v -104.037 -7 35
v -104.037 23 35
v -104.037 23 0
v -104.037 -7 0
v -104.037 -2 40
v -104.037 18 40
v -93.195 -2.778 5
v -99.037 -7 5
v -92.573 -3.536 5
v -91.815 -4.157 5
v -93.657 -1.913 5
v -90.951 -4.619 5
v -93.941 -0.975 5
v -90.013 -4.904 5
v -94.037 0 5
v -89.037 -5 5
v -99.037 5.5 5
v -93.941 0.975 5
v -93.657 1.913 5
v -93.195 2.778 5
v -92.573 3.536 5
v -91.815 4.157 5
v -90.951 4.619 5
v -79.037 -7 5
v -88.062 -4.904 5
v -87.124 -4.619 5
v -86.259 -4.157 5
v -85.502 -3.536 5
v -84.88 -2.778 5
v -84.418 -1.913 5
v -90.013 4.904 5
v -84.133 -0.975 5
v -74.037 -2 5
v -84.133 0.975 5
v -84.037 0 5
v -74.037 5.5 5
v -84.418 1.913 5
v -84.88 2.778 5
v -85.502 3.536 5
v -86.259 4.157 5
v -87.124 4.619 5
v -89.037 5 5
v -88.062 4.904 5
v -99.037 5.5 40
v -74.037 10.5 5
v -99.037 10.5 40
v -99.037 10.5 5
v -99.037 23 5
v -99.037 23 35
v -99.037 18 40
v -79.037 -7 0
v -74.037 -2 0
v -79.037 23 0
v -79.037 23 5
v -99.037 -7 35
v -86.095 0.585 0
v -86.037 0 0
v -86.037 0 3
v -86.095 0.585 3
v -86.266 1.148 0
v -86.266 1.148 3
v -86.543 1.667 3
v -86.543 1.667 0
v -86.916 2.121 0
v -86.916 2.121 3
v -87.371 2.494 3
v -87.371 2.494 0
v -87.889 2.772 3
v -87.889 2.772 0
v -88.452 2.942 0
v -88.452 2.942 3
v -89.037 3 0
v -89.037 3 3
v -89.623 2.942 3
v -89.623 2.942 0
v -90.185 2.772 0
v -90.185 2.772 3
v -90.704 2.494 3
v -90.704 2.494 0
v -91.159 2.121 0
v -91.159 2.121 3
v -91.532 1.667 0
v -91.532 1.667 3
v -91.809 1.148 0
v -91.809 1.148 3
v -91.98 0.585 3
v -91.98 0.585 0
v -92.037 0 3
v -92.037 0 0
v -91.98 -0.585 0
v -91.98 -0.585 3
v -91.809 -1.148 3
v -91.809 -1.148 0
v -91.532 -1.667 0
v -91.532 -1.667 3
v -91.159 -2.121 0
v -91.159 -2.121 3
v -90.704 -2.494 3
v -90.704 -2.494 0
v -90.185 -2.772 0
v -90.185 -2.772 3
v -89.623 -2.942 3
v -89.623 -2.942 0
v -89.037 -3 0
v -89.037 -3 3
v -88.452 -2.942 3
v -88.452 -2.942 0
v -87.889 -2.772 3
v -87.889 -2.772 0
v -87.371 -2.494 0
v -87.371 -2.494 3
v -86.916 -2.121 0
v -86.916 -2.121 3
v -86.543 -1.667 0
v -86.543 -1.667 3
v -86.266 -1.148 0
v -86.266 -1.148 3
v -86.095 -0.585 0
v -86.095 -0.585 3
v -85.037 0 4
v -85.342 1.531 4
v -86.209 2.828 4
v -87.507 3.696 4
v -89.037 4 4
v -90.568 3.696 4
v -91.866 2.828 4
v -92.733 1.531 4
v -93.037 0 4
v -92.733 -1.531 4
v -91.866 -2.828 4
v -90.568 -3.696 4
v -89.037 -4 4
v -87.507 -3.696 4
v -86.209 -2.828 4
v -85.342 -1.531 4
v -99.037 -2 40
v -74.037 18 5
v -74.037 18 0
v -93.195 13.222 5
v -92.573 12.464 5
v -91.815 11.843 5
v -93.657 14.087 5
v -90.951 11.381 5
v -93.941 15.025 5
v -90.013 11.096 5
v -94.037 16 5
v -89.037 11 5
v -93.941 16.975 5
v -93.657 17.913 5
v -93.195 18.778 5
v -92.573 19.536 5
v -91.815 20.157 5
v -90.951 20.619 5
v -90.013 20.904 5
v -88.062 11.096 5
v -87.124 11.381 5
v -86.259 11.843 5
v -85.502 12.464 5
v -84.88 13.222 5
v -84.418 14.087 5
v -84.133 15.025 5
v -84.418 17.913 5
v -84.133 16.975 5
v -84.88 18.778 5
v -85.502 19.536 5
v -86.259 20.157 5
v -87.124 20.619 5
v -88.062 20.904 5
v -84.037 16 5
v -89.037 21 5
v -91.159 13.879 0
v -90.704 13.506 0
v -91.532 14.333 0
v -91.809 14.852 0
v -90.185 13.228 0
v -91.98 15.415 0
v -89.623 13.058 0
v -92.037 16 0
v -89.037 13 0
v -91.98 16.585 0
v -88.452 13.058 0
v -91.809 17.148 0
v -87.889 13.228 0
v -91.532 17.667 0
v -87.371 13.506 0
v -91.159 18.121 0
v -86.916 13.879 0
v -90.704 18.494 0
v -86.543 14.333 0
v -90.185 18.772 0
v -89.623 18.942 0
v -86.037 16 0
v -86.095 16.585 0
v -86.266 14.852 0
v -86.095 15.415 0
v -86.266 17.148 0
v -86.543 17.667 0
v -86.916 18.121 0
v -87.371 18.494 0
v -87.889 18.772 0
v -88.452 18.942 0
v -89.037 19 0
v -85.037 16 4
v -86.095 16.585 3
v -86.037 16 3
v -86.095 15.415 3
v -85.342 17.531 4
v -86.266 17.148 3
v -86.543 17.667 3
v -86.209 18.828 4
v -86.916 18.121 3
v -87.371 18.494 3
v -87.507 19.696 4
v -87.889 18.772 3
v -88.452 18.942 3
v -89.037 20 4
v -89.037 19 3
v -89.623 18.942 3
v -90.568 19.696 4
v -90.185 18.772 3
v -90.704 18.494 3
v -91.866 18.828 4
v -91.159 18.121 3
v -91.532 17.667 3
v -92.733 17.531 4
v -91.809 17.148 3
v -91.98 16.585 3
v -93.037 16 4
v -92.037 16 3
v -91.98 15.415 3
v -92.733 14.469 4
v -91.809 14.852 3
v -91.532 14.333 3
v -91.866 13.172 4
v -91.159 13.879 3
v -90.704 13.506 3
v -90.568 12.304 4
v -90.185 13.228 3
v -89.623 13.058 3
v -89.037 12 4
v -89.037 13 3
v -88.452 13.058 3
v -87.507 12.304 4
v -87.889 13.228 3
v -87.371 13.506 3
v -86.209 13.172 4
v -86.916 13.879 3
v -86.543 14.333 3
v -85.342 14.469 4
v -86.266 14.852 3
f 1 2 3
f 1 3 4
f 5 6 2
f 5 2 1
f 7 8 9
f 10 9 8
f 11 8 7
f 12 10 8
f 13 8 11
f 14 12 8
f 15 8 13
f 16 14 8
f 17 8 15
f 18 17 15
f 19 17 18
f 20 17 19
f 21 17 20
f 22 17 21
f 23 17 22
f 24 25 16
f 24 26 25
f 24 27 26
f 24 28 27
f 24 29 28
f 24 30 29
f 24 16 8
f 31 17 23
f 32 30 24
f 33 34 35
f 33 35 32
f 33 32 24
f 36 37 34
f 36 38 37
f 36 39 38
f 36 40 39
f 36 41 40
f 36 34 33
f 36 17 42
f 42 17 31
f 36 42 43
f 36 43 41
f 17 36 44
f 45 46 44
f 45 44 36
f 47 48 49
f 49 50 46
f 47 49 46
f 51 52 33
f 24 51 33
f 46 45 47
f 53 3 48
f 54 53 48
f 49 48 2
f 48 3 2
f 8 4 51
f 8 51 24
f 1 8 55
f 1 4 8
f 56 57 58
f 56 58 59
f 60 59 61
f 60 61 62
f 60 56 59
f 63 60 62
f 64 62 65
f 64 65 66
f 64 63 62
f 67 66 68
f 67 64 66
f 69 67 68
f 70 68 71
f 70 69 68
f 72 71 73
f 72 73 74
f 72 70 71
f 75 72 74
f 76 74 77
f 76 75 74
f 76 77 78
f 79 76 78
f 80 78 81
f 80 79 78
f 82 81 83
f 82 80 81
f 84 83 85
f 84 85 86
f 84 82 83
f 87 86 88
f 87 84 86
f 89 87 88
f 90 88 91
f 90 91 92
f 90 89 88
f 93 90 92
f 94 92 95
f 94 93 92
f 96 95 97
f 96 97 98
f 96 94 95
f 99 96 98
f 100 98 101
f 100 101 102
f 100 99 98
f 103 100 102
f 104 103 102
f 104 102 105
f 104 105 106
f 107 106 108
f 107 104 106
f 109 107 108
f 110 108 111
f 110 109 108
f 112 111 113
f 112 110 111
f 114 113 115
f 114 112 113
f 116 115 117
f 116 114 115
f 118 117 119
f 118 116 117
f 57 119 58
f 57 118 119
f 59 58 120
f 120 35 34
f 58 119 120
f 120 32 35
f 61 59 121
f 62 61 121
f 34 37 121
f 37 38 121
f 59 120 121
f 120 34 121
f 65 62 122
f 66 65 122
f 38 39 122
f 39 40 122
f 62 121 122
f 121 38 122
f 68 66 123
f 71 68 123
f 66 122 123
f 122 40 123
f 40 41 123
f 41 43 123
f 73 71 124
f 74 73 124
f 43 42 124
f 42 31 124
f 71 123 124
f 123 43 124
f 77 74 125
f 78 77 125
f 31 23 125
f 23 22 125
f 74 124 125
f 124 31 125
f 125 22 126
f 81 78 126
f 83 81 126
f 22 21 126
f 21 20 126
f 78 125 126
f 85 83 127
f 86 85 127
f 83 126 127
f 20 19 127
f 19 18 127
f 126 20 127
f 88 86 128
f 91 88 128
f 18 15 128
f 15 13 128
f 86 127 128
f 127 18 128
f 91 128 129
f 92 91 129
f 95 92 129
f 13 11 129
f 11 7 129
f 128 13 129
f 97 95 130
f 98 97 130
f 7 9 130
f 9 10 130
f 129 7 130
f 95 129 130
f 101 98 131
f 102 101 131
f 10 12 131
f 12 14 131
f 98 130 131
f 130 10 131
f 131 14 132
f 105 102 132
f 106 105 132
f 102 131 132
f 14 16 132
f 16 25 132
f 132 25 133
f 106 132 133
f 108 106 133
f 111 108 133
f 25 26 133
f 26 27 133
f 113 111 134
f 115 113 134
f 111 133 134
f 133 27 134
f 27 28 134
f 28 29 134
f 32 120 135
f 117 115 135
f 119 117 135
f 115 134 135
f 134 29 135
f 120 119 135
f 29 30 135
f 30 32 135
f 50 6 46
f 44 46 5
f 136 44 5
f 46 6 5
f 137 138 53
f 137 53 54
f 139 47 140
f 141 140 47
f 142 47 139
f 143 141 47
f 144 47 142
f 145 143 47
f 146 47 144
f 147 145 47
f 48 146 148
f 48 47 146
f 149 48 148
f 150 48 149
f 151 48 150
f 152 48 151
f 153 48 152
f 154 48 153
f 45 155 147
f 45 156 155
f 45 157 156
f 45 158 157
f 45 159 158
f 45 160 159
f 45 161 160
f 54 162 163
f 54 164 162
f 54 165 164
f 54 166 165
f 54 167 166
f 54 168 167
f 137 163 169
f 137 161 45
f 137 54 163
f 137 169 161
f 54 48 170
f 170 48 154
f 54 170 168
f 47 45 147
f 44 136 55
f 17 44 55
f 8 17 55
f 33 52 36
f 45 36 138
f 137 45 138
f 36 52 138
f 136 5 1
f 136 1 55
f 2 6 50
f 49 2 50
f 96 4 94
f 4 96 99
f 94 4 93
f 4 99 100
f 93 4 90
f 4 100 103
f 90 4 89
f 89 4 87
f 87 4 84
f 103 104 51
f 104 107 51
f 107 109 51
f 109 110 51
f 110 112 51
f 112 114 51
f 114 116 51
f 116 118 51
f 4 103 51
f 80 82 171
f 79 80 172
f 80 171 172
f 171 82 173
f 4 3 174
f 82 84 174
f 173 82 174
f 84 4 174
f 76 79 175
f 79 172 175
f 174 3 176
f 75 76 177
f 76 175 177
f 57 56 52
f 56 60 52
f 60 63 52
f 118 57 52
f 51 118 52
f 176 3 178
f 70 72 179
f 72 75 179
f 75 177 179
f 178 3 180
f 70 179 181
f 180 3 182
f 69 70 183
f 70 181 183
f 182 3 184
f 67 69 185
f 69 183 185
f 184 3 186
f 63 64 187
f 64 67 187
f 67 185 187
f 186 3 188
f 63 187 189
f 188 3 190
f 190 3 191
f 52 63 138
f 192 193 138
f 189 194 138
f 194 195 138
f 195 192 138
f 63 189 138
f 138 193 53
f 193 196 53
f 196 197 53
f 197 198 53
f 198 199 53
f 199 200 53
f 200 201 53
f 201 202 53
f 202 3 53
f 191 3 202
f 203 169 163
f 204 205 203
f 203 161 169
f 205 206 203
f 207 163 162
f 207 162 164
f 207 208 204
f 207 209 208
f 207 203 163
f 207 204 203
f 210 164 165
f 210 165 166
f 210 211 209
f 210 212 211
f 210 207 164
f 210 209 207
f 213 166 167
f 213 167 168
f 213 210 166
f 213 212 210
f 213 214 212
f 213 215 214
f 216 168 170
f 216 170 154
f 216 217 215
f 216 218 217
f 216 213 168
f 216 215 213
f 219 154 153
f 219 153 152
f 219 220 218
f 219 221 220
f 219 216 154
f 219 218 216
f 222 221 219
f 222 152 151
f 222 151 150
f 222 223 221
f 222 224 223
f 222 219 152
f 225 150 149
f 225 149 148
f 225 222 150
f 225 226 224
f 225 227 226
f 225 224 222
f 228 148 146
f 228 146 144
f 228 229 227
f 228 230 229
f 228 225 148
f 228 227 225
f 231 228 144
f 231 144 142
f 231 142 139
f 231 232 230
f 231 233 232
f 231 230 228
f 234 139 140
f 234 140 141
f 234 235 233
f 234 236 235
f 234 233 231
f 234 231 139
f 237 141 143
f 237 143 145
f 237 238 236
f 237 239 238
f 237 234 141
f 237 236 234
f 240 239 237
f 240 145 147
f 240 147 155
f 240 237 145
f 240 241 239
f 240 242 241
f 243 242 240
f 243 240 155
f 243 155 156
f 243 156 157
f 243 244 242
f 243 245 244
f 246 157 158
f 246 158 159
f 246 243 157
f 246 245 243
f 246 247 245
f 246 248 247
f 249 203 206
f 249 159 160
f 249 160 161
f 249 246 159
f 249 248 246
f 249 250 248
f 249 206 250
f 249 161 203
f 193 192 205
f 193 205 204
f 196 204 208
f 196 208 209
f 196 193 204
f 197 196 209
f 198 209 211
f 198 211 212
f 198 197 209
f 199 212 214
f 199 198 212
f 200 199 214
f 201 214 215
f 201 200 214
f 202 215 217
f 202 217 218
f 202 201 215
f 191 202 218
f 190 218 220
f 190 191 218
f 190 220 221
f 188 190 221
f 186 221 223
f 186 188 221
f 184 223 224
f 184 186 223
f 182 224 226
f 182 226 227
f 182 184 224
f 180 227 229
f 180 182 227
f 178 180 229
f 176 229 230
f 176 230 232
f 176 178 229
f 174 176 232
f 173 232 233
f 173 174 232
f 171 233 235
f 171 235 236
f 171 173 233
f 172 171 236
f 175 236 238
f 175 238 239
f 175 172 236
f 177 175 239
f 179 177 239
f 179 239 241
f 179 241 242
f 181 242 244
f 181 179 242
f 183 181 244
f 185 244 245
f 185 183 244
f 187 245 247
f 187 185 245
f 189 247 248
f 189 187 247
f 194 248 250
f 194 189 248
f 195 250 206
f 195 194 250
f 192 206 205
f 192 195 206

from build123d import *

# Parameters (mm, degrees)
F0_W     = 30
F0_H     = 30
F0_R     = 3
F1_DEPTH = 5
F2_W     = 30
F2_H     = 35
F3_DEPTH = 5
F6_DEPTH = 2.5
F7_SIZE  = 5
F8_SIZE  = 2


with BuildPart() as f1:
    # F0 (on Top) → F1 (new body)
    with BuildSketch(Plane.XY):
        with Locations((-89.0373364091, 8)):
            Rectangle(F0_W, F0_H)
        with Locations((-89.0373364091, 0)):
            Circle(F0_R, mode=Mode.SUBTRACT)
        with Locations((-89.0373364091, 16)):
            Circle(F0_R, mode=Mode.SUBTRACT)
    extrude(amount=F1_DEPTH)

    # F2 (on face) → F3 (join)
    with BuildSketch(Plane(origin=(-104.0373364091, 0, 0), x_dir=(0, -1, 0), z_dir=(-1, 0, 0))):
        with Locations((-8, 22.5)):
            Rectangle(F2_W, F2_H)
    extrude(amount=-F3_DEPTH)

    # F5 (on line) → F6 (join, symmetric)
    with BuildSketch(Plane(origin=(0, 8, 0), x_dir=(-1, 0, 0), z_dir=(0, 1, 0))):
        Polygon((99.0373364091, 5), (99.0373364091, 40), (74.0373364091, 5), align=None)
    extrude(amount=F6_DEPTH, both=True)

    # F7
    f7_edges = [f1.edges().sort_by_distance(p)[0] for p in [
        (-101.537336, -7, 40),
        (-101.537336, 23, 40),
        (-74.037336, -7, 2.5),
        (-74.037336, 23, 2.5),
    ]]
    chamfer(f7_edges, length=F7_SIZE)

    # F8
    f8_edges = [f1.edges().sort_by_distance(p)[0] for p in [
        (-92.037336, 0, 5),
        (-92.037336, 16, 5),
    ]]
    chamfer(f8_edges, length=F8_SIZE)


solid = f1.part
